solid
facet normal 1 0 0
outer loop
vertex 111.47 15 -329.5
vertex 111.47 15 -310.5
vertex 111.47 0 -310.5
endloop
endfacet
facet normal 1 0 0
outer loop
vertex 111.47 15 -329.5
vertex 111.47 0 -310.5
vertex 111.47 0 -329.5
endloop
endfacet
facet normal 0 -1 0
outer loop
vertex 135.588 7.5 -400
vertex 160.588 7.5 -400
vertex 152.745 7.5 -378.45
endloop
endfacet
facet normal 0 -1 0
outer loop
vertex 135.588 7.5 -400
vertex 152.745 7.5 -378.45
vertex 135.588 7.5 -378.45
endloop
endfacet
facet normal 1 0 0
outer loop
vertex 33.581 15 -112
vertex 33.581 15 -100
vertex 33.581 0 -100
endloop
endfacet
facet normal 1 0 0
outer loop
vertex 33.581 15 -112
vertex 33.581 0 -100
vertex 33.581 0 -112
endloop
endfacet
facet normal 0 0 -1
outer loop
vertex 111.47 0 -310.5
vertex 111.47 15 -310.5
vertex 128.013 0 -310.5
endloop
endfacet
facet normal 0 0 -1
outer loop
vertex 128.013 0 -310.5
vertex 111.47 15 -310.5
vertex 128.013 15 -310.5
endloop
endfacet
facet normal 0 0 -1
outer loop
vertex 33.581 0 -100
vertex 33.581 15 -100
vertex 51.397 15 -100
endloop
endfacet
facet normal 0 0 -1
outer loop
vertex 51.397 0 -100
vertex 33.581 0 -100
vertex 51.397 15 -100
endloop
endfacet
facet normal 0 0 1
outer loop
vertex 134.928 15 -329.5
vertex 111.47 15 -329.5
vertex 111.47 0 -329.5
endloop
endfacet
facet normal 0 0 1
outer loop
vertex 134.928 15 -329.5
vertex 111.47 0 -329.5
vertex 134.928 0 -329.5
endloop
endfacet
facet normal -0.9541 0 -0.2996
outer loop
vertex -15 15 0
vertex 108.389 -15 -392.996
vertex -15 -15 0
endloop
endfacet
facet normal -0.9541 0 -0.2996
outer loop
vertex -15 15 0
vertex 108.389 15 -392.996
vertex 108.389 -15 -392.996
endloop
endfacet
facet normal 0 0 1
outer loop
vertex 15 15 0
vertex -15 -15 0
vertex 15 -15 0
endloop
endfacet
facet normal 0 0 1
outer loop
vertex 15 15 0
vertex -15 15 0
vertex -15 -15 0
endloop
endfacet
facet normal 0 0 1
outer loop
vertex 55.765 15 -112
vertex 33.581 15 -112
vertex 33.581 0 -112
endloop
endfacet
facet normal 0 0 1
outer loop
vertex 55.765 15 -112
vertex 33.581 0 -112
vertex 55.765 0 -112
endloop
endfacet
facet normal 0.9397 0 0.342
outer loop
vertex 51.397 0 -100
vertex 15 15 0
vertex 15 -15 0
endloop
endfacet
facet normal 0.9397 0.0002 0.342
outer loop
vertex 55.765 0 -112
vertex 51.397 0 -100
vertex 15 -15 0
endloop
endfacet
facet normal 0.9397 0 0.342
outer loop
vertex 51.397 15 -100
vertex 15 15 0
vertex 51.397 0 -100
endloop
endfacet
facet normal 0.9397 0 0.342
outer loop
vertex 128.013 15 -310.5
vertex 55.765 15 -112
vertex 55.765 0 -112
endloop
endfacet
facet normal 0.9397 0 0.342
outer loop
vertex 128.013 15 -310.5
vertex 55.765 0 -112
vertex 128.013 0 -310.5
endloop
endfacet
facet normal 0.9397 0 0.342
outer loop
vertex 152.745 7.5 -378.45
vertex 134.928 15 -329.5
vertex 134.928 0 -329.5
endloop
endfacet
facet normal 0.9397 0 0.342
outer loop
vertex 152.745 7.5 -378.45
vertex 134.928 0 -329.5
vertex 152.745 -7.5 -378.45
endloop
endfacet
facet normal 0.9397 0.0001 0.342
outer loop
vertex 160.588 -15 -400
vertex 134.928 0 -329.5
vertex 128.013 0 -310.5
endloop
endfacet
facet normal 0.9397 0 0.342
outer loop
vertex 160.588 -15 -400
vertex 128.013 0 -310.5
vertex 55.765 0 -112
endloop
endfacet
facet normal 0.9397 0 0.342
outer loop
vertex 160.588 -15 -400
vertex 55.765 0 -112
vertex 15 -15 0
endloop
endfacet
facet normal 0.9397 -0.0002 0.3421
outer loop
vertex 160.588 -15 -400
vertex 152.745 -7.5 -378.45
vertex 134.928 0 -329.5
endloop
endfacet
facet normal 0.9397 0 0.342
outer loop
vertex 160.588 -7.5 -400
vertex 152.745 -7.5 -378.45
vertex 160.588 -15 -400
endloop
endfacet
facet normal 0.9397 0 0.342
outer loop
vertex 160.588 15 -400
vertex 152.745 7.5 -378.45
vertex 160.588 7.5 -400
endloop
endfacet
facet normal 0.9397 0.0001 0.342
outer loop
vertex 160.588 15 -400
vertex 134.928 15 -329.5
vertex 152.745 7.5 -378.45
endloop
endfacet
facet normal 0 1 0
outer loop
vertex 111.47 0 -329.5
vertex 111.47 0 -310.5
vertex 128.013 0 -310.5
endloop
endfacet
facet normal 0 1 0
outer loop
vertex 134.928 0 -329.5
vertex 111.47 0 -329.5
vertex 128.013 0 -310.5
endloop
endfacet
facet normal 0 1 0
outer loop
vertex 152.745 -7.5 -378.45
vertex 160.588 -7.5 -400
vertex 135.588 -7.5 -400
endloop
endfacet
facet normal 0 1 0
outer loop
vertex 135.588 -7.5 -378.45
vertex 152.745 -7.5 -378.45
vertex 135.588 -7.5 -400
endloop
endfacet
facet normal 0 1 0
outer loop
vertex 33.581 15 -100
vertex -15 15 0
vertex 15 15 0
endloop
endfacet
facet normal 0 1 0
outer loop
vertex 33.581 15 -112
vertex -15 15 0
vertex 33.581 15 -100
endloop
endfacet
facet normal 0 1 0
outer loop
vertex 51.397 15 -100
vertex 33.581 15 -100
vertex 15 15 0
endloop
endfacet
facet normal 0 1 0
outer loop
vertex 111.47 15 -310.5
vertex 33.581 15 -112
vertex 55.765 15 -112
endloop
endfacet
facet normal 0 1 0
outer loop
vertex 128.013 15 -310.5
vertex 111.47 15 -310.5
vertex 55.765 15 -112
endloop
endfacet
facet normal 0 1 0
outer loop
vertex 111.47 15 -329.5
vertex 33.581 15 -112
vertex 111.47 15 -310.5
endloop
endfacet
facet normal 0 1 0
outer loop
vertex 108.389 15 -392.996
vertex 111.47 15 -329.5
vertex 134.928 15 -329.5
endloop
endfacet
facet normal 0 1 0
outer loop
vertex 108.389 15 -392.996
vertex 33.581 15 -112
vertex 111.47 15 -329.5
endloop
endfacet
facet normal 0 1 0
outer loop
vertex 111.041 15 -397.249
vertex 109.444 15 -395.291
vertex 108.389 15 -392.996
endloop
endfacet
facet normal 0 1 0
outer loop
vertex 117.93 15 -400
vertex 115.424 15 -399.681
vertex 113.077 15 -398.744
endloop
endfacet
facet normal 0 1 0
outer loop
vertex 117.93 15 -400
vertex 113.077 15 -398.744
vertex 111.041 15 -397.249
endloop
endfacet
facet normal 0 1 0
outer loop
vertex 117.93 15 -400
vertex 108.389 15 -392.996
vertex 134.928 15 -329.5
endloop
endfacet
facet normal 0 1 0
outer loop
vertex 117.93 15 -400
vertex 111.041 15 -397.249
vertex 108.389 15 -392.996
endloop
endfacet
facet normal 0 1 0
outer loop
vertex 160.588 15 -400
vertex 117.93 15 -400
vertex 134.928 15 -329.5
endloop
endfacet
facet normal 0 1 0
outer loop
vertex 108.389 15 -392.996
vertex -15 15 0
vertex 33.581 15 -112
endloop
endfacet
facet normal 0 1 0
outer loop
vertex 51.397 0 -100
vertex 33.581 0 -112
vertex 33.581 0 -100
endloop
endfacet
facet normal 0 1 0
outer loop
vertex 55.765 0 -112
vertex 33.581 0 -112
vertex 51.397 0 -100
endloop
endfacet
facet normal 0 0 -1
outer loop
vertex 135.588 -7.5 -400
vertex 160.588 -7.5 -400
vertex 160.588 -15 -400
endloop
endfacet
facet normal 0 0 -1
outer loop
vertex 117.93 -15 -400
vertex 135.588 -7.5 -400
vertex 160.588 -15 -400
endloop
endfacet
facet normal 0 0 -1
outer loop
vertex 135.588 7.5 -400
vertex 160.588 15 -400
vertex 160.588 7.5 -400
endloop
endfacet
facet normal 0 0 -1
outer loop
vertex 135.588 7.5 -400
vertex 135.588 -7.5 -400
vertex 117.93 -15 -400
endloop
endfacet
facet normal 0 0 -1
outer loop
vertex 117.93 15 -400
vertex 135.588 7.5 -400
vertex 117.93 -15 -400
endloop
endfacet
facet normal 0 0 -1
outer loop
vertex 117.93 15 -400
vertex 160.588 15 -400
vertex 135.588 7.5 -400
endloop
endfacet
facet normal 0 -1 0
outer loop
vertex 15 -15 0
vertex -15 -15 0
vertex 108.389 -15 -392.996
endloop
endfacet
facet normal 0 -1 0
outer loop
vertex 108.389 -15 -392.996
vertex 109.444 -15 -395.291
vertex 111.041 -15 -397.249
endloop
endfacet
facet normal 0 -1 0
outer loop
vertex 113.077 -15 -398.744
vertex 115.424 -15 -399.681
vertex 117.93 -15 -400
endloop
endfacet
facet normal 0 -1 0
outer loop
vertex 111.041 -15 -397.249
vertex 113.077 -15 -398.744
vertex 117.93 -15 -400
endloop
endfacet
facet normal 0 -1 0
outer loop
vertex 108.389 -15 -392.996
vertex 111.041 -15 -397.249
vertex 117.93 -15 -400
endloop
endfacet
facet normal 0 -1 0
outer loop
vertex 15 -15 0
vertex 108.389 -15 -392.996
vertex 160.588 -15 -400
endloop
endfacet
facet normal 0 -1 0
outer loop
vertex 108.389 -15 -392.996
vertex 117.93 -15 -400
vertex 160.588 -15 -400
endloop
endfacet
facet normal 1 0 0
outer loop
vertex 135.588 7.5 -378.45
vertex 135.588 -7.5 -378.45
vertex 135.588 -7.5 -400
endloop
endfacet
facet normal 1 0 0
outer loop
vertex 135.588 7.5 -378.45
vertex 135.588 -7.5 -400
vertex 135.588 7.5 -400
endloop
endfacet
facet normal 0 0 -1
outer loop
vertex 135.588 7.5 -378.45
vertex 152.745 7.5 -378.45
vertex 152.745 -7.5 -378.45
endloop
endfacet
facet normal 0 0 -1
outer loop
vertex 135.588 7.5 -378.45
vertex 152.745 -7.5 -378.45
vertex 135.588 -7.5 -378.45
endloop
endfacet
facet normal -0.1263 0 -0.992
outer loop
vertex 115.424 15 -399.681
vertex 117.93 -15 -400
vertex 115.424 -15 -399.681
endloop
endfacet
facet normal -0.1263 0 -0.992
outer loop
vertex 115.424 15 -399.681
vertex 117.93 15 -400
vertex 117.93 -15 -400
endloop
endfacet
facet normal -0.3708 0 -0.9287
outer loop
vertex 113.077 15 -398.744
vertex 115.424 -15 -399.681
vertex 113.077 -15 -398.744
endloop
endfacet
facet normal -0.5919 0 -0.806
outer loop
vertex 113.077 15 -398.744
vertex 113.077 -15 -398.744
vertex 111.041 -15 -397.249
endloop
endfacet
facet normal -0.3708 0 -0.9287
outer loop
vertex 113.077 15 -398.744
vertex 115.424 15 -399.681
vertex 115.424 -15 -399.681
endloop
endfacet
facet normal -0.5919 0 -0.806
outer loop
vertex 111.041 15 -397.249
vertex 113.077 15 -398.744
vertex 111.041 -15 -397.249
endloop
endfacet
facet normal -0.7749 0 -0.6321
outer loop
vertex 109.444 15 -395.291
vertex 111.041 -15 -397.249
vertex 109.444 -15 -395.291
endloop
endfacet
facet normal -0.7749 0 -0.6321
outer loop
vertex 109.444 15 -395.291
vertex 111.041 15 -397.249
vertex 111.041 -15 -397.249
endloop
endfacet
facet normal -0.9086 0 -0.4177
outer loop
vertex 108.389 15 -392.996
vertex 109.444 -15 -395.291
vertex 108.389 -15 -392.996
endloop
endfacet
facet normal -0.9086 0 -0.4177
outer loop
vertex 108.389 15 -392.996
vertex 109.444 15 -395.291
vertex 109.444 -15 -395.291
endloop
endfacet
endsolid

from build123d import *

# Parameters (mm, degrees)
SALIENTE_EXTRUIR1_DEPTH = 15
CROQUIS2_W              = 25
CROQUIS2_H              = 15
CORTAR_EXTRUIR1_DEPTH   = 21.55
REDONDEO2_R             = 10
CROQUIS3_W              = 40
CROQUIS3_H              = 19
CROQUIS3_H_2            = 12
CORTAR_EXTRUIR2_DEPTH   = 15


with BuildPart() as part:
    # Croquis1 → Saliente-Extruir1 (new, symmetric)
    with BuildSketch(Plane(origin=(0, 0, 0), x_dir=(1, 0, 0), z_dir=(0, 1, 0))):
        Polygon((15, 0), (160.588093706, 400), (110.588093706, 400), (-15, 0), align=None)
    extrude(amount=SALIENTE_EXTRUIR1_DEPTH, both=True)

    # Croquis2 → Cortar-Extruir1 (cut)
    with BuildSketch(Plane(origin=(0, 0, -400), x_dir=(-1, 0, 0), z_dir=(0, 0, -1))):
        with Locations((-148.088093706, 0)):
            Rectangle(CROQUIS2_W, CROQUIS2_H)
    extrude(amount=-CORTAR_EXTRUIR1_DEPTH, mode=Mode.SUBTRACT)

    # Redondeo2
    redondeo2_edges = [part.edges().sort_by_distance(p)[0] for p in [
        (110.588093706, 0, -400),
    ]]
    fillet(redondeo2_edges, radius=REDONDEO2_R)

    # Croquis3 → Cortar-Extruir2 (cut)
    with BuildSketch(Plane(origin=(0, 15, 0), x_dir=(1, 0, 0), z_dir=(0, 1, 0))):
        with Locations((131.470474965, 320)):
            Rectangle(CROQUIS3_W, CROQUIS3_H)
        with Locations((53.580844832, 106)):
            Rectangle(CROQUIS3_W, CROQUIS3_H_2)
    extrude(amount=-CORTAR_EXTRUIR2_DEPTH, mode=Mode.SUBTRACT)


solid = part.part
